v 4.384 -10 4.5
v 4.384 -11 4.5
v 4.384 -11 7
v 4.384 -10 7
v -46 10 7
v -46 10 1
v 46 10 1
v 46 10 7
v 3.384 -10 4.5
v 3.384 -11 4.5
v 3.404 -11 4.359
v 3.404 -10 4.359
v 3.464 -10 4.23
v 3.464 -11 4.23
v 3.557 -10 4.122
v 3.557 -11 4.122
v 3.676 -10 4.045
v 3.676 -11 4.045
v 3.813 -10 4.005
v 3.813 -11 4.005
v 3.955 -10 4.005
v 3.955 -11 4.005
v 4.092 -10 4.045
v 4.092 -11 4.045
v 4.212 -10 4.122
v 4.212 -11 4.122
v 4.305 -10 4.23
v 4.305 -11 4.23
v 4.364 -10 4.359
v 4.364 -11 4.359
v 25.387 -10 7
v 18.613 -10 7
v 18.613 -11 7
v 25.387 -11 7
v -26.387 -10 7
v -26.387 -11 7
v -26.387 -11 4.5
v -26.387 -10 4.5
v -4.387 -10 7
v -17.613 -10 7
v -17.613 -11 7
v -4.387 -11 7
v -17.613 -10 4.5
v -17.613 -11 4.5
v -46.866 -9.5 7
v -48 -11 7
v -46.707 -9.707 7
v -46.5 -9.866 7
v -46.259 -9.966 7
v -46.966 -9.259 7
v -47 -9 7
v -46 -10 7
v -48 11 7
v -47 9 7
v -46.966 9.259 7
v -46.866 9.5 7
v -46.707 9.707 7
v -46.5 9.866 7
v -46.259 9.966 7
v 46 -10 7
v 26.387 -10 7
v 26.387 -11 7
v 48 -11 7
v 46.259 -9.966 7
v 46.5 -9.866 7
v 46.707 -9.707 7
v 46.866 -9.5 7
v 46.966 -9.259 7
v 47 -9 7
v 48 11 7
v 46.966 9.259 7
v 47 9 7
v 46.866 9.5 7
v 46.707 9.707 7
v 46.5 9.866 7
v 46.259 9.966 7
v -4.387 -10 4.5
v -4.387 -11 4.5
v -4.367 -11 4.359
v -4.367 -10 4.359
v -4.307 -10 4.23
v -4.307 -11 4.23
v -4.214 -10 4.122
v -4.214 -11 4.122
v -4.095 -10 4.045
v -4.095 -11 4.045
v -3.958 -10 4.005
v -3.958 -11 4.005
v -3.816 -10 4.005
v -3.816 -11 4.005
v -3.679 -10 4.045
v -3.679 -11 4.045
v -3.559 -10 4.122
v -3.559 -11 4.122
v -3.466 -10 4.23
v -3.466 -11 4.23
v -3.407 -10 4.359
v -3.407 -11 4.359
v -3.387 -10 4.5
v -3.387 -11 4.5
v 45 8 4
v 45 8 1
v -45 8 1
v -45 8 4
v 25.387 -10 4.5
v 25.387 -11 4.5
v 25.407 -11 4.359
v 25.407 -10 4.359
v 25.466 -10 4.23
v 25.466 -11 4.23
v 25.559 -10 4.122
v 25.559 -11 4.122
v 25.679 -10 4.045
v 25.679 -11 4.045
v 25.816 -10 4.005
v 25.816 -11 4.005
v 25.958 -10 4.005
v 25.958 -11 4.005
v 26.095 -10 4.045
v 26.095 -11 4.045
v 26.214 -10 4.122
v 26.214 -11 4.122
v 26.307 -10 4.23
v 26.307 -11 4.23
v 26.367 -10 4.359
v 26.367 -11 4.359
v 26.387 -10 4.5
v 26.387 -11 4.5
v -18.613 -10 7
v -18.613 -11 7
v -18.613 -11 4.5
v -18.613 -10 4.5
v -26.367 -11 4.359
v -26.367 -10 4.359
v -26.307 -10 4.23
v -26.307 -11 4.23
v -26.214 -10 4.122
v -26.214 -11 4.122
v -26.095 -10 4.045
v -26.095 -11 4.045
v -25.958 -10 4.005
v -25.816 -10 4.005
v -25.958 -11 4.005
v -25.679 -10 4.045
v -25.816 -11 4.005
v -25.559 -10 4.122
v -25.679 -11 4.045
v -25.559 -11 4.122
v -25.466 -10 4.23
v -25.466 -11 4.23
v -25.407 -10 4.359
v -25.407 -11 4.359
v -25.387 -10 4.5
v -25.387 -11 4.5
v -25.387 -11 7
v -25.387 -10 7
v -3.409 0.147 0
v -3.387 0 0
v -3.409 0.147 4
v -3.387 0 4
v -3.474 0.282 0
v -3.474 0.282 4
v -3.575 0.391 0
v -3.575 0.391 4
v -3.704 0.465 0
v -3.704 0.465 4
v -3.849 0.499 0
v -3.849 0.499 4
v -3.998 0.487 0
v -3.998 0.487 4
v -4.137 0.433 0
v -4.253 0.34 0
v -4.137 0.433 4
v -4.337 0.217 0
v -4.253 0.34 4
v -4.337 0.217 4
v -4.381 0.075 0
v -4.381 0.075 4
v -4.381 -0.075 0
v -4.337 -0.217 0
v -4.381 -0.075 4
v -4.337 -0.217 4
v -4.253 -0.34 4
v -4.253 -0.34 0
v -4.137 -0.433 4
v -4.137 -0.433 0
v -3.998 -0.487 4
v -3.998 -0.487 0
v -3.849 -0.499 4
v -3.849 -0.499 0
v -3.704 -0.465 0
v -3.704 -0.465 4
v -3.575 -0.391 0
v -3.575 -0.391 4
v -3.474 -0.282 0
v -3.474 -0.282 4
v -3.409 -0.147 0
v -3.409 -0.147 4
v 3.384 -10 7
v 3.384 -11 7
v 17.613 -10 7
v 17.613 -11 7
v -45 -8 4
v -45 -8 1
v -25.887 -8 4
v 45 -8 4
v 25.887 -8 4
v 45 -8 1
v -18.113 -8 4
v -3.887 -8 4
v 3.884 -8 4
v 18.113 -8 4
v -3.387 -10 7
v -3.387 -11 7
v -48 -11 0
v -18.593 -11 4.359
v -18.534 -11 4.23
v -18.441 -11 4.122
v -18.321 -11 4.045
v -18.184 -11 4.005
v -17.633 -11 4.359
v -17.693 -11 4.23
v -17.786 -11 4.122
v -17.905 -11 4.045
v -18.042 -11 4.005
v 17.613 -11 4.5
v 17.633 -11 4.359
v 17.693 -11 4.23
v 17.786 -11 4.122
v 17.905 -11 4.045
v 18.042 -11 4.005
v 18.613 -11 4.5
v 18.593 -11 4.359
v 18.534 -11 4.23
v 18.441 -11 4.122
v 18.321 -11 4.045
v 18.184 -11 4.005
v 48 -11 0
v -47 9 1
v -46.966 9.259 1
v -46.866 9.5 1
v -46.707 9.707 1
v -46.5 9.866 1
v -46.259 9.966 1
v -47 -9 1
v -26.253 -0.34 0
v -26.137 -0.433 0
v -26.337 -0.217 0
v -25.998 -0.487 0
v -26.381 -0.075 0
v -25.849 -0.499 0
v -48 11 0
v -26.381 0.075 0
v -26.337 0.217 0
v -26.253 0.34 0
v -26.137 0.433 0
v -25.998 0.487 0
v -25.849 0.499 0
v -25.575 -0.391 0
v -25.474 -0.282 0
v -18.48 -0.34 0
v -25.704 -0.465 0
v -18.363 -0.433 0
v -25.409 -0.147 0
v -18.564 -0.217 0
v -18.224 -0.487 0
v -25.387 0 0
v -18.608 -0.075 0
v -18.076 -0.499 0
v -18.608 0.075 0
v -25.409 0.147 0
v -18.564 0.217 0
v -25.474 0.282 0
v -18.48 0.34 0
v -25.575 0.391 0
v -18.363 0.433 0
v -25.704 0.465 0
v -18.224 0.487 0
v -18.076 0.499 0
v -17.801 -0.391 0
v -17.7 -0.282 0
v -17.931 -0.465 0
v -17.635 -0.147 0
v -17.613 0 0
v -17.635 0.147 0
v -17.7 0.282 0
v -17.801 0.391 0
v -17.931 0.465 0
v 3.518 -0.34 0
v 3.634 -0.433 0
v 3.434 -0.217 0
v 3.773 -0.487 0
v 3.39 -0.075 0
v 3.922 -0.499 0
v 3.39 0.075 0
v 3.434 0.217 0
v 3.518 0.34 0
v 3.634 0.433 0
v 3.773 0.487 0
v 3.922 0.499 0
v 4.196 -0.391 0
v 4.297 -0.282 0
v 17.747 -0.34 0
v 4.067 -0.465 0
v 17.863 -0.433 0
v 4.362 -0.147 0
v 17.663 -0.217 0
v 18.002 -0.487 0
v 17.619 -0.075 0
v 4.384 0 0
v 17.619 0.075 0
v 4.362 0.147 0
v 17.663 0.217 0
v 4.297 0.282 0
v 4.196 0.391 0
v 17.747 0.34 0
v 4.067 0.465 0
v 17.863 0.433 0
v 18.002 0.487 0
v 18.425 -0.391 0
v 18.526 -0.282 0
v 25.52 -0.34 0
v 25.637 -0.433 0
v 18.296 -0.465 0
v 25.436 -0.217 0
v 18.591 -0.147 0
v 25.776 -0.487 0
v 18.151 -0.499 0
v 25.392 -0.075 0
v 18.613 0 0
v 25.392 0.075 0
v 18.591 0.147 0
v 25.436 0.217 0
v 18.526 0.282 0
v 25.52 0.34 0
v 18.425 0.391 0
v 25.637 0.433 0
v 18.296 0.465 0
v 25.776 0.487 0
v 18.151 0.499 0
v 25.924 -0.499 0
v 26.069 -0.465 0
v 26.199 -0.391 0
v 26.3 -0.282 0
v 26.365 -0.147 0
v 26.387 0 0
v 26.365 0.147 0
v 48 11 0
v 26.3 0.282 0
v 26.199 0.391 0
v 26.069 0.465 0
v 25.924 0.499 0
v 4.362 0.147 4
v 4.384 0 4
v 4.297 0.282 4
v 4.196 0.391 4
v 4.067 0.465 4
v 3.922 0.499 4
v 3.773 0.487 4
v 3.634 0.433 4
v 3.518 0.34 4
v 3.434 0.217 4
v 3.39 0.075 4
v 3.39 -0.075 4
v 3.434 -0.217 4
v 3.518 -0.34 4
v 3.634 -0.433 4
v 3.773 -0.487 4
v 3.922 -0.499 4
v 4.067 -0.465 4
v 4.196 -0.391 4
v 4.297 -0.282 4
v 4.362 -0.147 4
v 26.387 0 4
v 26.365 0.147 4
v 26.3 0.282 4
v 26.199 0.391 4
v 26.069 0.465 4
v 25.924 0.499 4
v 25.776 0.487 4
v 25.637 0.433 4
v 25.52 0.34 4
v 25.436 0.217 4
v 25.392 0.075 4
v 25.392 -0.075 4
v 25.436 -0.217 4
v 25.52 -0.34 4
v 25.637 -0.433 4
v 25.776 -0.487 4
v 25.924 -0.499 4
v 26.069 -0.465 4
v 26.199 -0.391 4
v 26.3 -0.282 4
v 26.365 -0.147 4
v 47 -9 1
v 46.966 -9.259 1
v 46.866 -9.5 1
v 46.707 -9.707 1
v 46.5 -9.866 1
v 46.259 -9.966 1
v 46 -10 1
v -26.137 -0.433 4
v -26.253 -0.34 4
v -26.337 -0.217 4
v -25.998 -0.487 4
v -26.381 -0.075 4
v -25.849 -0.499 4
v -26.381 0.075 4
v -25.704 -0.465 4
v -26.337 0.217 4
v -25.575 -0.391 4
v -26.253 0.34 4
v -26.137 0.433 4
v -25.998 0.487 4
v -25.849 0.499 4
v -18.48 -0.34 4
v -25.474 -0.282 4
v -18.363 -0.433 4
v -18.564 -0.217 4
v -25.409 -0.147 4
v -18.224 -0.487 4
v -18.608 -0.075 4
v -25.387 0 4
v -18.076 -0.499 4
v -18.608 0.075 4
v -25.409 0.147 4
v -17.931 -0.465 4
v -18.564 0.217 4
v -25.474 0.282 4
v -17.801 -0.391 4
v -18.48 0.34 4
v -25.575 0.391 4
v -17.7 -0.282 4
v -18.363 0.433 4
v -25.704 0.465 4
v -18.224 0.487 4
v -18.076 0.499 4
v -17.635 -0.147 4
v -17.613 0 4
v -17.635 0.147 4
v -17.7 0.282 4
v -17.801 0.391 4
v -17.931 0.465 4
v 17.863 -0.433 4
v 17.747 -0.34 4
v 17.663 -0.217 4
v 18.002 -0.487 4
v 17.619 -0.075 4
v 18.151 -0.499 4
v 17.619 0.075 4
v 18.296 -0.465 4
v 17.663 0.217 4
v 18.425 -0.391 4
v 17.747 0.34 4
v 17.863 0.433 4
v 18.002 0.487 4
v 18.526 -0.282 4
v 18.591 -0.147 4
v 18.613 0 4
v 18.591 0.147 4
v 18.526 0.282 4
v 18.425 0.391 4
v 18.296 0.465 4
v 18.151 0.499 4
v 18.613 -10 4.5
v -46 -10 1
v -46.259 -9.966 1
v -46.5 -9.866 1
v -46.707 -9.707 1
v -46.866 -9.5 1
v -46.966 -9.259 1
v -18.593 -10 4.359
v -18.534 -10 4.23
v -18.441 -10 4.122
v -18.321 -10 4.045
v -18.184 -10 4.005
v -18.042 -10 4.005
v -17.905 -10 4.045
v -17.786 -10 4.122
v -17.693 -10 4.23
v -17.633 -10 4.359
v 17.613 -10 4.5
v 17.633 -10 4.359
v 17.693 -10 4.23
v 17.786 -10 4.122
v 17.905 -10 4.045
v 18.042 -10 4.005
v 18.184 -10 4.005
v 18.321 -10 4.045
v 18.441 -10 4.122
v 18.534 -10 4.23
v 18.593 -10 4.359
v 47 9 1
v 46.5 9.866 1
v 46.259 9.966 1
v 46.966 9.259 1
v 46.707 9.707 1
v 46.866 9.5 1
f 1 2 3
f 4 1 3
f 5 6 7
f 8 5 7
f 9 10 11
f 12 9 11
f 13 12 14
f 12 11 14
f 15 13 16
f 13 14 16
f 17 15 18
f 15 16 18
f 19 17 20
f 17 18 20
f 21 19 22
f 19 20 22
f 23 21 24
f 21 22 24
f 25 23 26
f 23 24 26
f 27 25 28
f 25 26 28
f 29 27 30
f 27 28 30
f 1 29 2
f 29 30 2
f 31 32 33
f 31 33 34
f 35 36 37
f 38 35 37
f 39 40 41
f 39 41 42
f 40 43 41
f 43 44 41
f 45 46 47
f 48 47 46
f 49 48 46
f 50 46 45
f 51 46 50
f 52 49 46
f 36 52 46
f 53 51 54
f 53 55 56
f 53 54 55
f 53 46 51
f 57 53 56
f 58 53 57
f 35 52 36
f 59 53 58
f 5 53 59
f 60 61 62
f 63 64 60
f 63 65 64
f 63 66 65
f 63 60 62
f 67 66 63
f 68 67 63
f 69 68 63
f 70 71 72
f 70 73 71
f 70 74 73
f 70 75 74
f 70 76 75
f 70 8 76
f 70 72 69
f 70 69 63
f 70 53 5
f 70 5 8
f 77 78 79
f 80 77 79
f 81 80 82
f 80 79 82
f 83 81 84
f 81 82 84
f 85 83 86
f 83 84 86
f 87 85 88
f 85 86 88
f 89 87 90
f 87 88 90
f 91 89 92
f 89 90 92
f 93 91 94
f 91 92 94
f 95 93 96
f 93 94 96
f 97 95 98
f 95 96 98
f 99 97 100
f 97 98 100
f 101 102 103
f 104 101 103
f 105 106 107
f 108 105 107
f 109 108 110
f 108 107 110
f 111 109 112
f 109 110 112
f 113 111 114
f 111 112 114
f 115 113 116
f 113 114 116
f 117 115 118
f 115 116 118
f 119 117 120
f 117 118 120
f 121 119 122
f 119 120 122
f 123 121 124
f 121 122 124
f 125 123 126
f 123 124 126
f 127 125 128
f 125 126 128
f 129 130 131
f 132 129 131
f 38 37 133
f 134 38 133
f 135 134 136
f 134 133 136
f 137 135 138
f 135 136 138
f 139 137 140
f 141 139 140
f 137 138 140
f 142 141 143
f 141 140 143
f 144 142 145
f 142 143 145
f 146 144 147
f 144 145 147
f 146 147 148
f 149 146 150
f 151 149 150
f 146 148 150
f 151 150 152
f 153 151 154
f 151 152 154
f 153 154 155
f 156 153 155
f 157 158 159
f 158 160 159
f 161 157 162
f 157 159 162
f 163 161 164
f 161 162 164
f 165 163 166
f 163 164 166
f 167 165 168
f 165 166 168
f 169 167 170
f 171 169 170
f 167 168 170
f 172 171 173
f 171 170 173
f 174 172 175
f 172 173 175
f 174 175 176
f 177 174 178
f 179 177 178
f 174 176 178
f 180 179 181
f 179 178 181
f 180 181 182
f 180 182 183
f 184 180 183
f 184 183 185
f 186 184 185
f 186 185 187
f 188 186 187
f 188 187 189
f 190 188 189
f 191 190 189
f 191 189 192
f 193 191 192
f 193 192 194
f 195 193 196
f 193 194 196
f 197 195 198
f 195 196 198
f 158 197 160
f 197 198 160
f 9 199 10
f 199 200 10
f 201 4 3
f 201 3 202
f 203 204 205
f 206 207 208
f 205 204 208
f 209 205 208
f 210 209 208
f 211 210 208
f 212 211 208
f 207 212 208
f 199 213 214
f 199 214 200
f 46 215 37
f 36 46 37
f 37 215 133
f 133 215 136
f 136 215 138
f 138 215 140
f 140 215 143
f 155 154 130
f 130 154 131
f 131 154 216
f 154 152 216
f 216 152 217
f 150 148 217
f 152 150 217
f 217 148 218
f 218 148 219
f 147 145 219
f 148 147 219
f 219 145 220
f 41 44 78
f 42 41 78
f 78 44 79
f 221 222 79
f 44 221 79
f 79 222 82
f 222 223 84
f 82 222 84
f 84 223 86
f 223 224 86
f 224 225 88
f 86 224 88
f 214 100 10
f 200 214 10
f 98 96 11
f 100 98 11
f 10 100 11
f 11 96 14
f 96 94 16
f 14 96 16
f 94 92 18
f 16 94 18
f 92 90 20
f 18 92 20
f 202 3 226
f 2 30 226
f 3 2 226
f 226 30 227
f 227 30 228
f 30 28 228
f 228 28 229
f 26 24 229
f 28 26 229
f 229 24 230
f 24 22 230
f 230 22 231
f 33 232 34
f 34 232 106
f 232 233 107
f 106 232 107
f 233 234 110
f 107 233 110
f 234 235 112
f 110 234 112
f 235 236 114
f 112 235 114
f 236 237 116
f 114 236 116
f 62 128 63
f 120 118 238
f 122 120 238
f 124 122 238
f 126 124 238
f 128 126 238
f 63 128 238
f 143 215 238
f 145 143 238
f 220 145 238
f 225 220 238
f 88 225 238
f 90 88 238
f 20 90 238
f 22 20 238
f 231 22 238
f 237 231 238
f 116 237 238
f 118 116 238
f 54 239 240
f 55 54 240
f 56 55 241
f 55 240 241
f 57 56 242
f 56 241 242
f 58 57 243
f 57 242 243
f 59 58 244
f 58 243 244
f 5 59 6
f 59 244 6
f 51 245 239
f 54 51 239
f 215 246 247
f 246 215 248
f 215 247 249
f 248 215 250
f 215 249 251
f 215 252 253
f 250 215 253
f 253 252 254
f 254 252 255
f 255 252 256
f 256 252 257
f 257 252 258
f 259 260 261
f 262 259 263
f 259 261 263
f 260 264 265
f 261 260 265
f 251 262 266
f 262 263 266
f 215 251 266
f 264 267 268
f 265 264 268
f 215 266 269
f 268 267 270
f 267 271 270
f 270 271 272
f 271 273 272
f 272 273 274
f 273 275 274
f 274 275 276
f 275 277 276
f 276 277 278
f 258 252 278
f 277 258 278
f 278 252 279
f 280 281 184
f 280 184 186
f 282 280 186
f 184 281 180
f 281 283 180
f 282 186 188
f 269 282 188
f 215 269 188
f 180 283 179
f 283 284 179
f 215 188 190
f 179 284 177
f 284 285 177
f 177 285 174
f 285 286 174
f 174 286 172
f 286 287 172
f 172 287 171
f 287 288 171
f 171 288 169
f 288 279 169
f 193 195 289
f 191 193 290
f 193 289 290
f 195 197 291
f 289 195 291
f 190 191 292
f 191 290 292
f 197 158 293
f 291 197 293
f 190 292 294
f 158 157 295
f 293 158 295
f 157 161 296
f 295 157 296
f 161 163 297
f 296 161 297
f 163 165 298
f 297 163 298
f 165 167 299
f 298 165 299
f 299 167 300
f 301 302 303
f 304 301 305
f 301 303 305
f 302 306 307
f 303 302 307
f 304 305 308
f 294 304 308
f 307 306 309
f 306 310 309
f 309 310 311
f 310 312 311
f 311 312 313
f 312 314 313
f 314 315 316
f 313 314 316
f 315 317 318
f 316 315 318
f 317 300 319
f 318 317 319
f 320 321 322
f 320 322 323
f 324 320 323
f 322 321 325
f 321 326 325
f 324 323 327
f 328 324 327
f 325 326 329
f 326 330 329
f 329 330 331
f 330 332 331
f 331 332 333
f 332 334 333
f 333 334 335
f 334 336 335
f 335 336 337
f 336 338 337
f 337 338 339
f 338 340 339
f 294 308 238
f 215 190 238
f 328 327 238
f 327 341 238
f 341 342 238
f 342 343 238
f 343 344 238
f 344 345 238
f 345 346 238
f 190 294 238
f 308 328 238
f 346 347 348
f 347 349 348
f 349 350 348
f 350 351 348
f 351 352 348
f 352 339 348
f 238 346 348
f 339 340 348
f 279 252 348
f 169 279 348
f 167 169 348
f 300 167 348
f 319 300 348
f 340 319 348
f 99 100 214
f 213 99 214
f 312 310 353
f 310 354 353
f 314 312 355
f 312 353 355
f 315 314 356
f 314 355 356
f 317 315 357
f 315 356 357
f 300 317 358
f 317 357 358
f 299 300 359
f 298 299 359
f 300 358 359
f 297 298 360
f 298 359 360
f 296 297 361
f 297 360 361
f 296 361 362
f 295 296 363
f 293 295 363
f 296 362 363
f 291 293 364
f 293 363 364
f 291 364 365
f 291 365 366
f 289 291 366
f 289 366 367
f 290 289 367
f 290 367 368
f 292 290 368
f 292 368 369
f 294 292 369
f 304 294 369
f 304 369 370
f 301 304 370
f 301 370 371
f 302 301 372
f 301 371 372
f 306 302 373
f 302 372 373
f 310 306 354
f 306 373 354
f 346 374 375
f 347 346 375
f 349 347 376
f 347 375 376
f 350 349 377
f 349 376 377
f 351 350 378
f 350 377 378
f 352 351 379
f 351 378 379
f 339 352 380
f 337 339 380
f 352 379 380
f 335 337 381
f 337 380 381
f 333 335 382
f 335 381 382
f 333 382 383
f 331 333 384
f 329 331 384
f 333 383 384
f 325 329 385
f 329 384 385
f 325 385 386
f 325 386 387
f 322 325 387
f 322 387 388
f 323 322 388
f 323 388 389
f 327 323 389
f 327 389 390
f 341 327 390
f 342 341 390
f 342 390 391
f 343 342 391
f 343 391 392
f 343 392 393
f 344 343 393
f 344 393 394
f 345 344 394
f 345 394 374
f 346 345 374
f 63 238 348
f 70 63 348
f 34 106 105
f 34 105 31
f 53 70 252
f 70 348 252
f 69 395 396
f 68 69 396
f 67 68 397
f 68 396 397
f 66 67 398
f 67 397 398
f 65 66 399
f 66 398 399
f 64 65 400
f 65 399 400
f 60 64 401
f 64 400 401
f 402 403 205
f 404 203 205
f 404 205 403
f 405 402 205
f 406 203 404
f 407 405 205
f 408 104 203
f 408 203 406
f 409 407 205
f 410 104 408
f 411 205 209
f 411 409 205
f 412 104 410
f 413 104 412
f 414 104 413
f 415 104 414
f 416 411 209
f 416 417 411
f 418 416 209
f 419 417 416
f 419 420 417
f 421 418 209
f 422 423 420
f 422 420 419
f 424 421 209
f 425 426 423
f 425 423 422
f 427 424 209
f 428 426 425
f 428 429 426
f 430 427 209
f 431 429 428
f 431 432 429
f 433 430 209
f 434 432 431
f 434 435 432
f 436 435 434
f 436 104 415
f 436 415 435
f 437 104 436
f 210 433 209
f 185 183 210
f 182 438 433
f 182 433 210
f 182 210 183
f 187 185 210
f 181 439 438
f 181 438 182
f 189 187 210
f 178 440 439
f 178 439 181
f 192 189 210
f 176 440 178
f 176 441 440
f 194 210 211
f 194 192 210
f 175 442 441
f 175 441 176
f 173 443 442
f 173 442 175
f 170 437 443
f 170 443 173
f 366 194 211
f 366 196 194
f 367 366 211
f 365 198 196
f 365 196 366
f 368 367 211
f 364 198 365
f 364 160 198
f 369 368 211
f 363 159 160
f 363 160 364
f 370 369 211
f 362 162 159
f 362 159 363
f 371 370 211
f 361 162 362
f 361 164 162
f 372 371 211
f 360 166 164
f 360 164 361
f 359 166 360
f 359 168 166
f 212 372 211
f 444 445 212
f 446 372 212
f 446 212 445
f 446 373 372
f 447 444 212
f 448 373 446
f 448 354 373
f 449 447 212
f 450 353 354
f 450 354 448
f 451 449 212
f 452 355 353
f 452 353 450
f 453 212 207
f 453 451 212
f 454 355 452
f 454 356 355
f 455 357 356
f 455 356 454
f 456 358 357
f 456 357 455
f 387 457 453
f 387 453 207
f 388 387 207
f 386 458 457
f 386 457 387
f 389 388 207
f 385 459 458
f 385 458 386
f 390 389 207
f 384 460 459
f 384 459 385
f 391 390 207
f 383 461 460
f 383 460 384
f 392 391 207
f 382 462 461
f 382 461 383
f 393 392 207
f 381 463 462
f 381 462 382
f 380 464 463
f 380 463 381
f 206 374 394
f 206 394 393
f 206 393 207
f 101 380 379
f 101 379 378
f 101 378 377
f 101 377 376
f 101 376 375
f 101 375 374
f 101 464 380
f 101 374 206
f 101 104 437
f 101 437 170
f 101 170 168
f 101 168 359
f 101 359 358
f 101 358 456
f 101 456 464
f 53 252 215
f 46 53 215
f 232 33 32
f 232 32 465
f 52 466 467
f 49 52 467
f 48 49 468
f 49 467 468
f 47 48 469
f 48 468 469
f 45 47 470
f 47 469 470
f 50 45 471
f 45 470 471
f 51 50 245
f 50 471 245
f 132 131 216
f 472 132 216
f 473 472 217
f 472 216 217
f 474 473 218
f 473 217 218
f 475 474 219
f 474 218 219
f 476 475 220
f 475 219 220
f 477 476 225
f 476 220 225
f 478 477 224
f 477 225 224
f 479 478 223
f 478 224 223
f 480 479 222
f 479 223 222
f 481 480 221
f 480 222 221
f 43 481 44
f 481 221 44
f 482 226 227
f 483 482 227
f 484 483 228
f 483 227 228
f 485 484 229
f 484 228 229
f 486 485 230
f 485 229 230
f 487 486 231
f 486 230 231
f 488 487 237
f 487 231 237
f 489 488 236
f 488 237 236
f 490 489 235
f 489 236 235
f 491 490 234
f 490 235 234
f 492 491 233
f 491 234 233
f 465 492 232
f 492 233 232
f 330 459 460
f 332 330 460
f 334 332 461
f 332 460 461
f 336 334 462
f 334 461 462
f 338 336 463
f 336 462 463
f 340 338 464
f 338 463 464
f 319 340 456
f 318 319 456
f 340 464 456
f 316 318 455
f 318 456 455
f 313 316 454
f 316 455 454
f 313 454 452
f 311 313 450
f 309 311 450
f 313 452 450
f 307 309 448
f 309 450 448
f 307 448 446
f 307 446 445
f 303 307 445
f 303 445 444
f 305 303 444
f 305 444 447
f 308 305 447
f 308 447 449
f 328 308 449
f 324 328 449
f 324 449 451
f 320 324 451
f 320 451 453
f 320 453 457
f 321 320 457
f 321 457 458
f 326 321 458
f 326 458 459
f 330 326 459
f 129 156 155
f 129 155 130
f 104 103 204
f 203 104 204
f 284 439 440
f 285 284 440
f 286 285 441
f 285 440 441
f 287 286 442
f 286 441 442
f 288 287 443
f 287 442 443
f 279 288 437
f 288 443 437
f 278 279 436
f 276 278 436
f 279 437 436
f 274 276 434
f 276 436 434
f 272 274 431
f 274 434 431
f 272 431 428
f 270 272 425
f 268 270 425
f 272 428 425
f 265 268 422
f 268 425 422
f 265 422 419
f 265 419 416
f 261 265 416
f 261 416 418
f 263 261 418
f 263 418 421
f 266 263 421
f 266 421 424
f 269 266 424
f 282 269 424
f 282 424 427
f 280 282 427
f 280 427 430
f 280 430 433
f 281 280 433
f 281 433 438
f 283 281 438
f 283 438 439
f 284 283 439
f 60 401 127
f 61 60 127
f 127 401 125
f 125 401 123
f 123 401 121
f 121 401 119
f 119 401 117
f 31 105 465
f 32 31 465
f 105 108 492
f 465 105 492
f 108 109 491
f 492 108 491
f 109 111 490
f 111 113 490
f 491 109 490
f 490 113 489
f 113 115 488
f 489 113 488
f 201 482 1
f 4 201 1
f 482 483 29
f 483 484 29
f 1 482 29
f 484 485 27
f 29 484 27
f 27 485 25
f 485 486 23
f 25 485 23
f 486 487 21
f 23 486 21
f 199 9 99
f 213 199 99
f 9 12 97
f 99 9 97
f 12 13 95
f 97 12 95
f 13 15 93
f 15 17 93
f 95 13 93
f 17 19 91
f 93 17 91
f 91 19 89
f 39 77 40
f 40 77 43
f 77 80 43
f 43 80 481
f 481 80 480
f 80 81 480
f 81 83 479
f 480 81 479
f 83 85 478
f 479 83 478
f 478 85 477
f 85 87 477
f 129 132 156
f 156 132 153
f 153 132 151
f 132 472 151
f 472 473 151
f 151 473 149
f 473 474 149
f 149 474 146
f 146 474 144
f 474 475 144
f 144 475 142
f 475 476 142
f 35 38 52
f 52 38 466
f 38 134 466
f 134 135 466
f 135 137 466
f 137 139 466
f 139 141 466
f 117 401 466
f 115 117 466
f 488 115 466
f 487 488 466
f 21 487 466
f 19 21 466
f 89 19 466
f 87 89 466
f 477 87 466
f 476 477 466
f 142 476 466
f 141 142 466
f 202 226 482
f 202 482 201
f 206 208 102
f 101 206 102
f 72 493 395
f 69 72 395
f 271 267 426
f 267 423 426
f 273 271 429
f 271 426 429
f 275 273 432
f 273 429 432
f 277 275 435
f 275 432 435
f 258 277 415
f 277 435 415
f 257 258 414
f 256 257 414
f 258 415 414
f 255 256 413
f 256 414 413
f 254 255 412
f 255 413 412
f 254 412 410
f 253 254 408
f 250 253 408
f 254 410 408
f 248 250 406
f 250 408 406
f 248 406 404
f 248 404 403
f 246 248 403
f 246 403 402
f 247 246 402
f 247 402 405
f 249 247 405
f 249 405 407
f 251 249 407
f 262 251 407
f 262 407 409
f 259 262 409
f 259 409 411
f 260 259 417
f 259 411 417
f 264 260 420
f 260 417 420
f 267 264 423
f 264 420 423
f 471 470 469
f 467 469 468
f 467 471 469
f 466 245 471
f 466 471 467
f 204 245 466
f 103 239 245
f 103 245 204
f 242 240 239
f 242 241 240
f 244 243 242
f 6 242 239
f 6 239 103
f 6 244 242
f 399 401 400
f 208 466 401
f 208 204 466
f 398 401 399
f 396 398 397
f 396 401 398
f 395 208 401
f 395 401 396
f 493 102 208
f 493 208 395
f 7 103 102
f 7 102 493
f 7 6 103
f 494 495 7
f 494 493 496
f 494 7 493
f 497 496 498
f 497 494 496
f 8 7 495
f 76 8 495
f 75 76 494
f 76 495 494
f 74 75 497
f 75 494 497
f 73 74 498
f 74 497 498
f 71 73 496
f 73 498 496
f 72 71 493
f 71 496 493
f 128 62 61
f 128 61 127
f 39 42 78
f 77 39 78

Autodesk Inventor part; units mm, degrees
ref_plane "YZ Plane" through (0, 0, 0) normal (1, 0, 0) x (0, 1, 0)
ref_plane "XZ Plane" through (0, 0, 0) normal (0, 1, 0) x (-1, 0, 0)
ref_plane "XY Plane" through (0, 0, 0) normal (0, 0, 1) x (1, 0, 0)
sketch "Sketch2" plane through (0, 0, 0) normal (0, 0, 1) x (1, 0, 0)
  line L0 (-46, 10) -> (46, 10)
  line L1 (47, 9) -> (47, -9)
  line L2 (46, -10) -> (-46, -10)
  line L3 (-47, -9) -> (-47, 9)
  line L4 (-47, 10) -> (47, -10) construction
  line L5 (47, 10) -> (-47, -10) construction
  line L6 (45, 8) -> (-45, 8)
  line L7 (-45, 8) -> (-45, -8)
  line L8 (-45, -8) -> (45, -8)
  line L9 (45, -8) -> (45, 8)
  line L10 (48, 11) -> (-48, 11)
  line L11 (-48, 11) -> (-48, -11)
  line L12 (-48, -11) -> (48, -11)
  line L13 (48, -11) -> (48, 11)
  arc A0 (47, 9) -> (46, 10) centre (46, 9) ccw
  arc A1 (46, -10) -> (47, -9) centre (46, -9) ccw
  arc A2 (-47, -9) -> (-46, -10) centre (-46, -9) ccw
  arc A3 (-46, 10) -> (-47, 9) centre (-46, 9) ccw
  point P0 (0, 0)
  dimension "d0" = 94
  dimension "d1" = 20
  dimension "d2" = 2
  dimension "d3" = 1
  dimension "d10" = 1
  dimension "d40" = 90
extrude "Extrusion1" add sketch "Sketch2" along normal blind 1 contours L0 A0 L1 A1 L2 A2 L3 A3 | L9 L8 L7 L6 | L13 L12 L11 L10
extrude "Extrusion2" add sketch "Sketch2" along normal blind 7 contours L13 L12 L11 L10
extrude "Extrusion3" add sketch "Sketch2" along normal blind 4 contours L9 L8 L7 L6
sketch "Sketch4" plane through (-48, -11, 0) normal (0, -1, 0) x (1, 0, 0)
  circle A0 centre (22.1132, 6) radius 0.5
  circle A1 centre (29.8868, 6) radius 0.5
  circle A2 centre (44.1132, 6) radius 0.5
  circle A3 centre (51.8842, 6) radius 0.5
  circle A4 centre (66.1132, 6) radius 0.5
  circle A5 centre (73.8868, 6) radius 0.5
  line L0 (0, 6) -> (96, 6)
  line L1 (96, 7) -> (0, 7) projected
  line L2 (22.1132, 4) -> (22.1132, 4)
  line L3 (22.6132, 4.5) -> (22.6132, 8)
  line L4 (22.6132, 8) -> (21.6132, 8)
  line L5 (21.6132, 8) -> (21.6132, 4.5)
  line L6 (21.6132, 4) -> (22.6132, 8) construction
  line L7 (22.6132, 4) -> (21.6132, 8) construction
  line L8 (29.8868, 4) -> (29.8868, 4)
  line L9 (30.3868, 4.5) -> (30.3868, 8)
  line L10 (30.3868, 8) -> (29.3868, 8)
  line L11 (29.3868, 8) -> (29.3868, 4.5)
  line L12 (29.3868, 4) -> (30.3868, 8) construction
  line L13 (30.3868, 4) -> (29.3868, 8) construction
  line L14 (44.1132, 4) -> (44.1132, 4)
  line L15 (44.6132, 4.5) -> (44.6132, 8)
  line L16 (44.6132, 8) -> (43.6132, 8)
  line L17 (43.6132, 8) -> (43.6132, 4.5)
  line L18 (43.6132, 4) -> (44.6132, 8) construction
  line L19 (44.6132, 4) -> (43.6132, 8) construction
  line L20 (51.8842, 4) -> (51.8842, 4)
  line L21 (52.3842, 4.5) -> (52.3842, 8)
  line L22 (52.3842, 8) -> (51.3842, 8)
  line L23 (51.3842, 8) -> (51.3842, 4.5)
  line L24 (51.3842, 4) -> (52.3842, 8) construction
  line L25 (52.3842, 4) -> (51.3842, 8) construction
  line L26 (66.1132, 4) -> (66.1132, 4)
  line L27 (65.6132, 4.5) -> (65.6132, 8)
  line L28 (65.6132, 8) -> (66.6132, 8)
  line L29 (66.6132, 8) -> (66.6132, 4.5)
  line L30 (66.6132, 4) -> (65.6132, 8) construction
  line L31 (65.6132, 4) -> (66.6132, 8) construction
  line L32 (73.8868, 4) -> (73.8868, 4)
  line L33 (73.3868, 4.5) -> (73.3868, 8)
  line L34 (73.3868, 8) -> (74.3868, 8)
  line L35 (74.3868, 8) -> (74.3868, 4.5)
  line L36 (74.3868, 4) -> (73.3868, 8) construction
  line L37 (73.3868, 4) -> (74.3868, 8) construction
  arc A6 (21.6132, 4.5) -> (22.1132, 4) centre (22.1132, 4.5) ccw
  arc A7 (22.1132, 4) -> (22.6132, 4.5) centre (22.1132, 4.5) ccw
  arc A8 (29.3868, 4.5) -> (29.8868, 4) centre (29.8868, 4.5) ccw
  arc A9 (29.8868, 4) -> (30.3868, 4.5) centre (29.8868, 4.5) ccw
  arc A10 (43.6132, 4.5) -> (44.1132, 4) centre (44.1132, 4.5) ccw
  arc A11 (44.1132, 4) -> (44.6132, 4.5) centre (44.1132, 4.5) ccw
  arc A12 (51.3842, 4.5) -> (51.8842, 4) centre (51.8842, 4.5) ccw
  arc A13 (51.8842, 4) -> (52.3842, 4.5) centre (51.8842, 4.5) ccw
  arc A14 (65.6132, 4.5) -> (66.1132, 4) centre (66.1132, 4.5) ccw
  arc A15 (66.1132, 4) -> (66.6132, 4.5) centre (66.1132, 4.5) ccw
  arc A16 (73.3868, 4.5) -> (73.8868, 4) centre (73.8868, 4.5) ccw
  arc A17 (73.8868, 4) -> (74.3868, 4.5) centre (73.8868, 4.5) ccw
  point P0 (96, 0)
  point P1 (69, 6)
  point P2 (71, 6)
  point P3 (49, 6)
  point P4 (47, 6)
  point P5 (27, 6)
  point P6 (25, 6)
  point P7 (22.1132, 4)
  dimension "d59" = 1
  dimension "d60" = 1
  dimension "d61" = 1
  dimension "d62" = 1
  dimension "d63" = 1
  dimension "d64" = 1
  dimension "d65" = 1
  dimension "d66" = 4
  dimension "d67" = 1
  dimension "d68" = 4
  dimension "d69" = 1
  dimension "d70" = 4
  dimension "d71" = 1
  dimension "d72" = 4
  dimension "d73" = 1
  dimension "d74" = 4
  dimension "d75" = 1
  dimension "d76" = 4
  dimension "d81" = 0.5
sketch "Sketch3" plane through (0, 0, 4) normal (0, 0, 1) x (1, 0, 0)
  line L0 (-53.1158, -1) -> (46.8842, -1) construction
  line L1 (43, 0) -> (23, 0) construction
  line L2 (23, 0) -> (23, 5) construction
  line L3 (23, 5) -> (43, 5) construction
  line L4 (43, 5) -> (43, 0) construction
  line L5 (23, 0) -> (23, 5.2137) construction
  line L6 (43, 0) -> (40.1132, 5) construction
  line L7 (46.8842, -1) -> (46.8842, 4.7735) construction
  line L8 (23, 0) -> (25.8868, 5) construction
  line L9 (23, 0) -> (23, 4.6279) construction
  line L10 (21, 0) -> (18.1132, 5) construction
  line L11 (1, 5) -> (21, 5) construction
  line L12 (1, 0) -> (3.8868, 5) construction
  line L13 (-1, 0) -> (-3.8868, 5) construction
  line L14 (-21, 5) -> (-1, 5) construction
  line L15 (-21, 0) -> (-18.1132, 5) construction
  line L16 (-23, 0) -> (-25.8868, 5) construction
  line L17 (-43, 5) -> (-23, 5) construction
  line L18 (-43, 0) -> (-40.1132, 5) construction
  line L19 (43, 5) -> (-43, 5) construction
  line L20 (0, 5) -> (0, 5) construction
  circle A0 centre (-25.8868, 0) radius 0.5
  circle A1 centre (-18.1132, 0) radius 0.5
  circle A2 centre (-3.8868, 0) radius 0.5
  circle A3 centre (3.8842, 0) radius 0.5
  circle A4 centre (18.1132, 0) radius 0.5
  circle A5 centre (25.8868, 0) radius 0.5
  line L21 (-45, 8) -> (-45, -8) projected
  line L22 (45, -8) -> (45, 8) projected
  line L23 (-48, 11) -> (-48, -11) projected
  line L24 (-48, 0) -> (48, 0)
  line L25 (48, -11) -> (48, 11) projected
  point P0 (3.8842, 4)
  dimension "d45" = 20
  dimension "d46" = 5
  dimension "d47" = 30
  dimension "d48" = 30
  dimension "d49" = 22
  dimension "d52" = 0
  dimension "d53" = 1
  dimension "d54" = 1
  dimension "d55" = 1
  dimension "d56" = 1
  dimension "d57" = 1
  dimension "d58" = 1
extrude "Extrusion4" cut sketch "Sketch4" against normal blind 10 contours L0 A0 | L3 A7 A6 L5 A0 | A0 L0 | A0 L5 L1 L3 | L11 L1 L9 A1 | L0 A1 | A1 L0 | A1 L9 A9 A8 L11 | L1 L5 L4 L3 | L11 L10 L9 L1 | L17 L1 L15 A2 | L0 A2 | A2 L0 | A2 L15 A11 A10 L17 | L17 L16 L15 L1 | L23 L1 L21 A3 | L0 A3 | A3 L0 | A3 L21 A13 A12 L23 | L23 L22 L21 L1 | L27 L1 L29 A4 | L0 A4 | A4 L0 | A4 L29 A15 A14 L27 | L27 L28 L29 L1 | L33 L1 L35 A5 | L0 A5 | A5 L0 | A5 L35 A17 A16 L33 | L33 L34 L35 L1
extrude "Extrusion5" cut sketch "Sketch3" against normal blind 10
properties part number "sdm_finger_eit_chamber_mould"
